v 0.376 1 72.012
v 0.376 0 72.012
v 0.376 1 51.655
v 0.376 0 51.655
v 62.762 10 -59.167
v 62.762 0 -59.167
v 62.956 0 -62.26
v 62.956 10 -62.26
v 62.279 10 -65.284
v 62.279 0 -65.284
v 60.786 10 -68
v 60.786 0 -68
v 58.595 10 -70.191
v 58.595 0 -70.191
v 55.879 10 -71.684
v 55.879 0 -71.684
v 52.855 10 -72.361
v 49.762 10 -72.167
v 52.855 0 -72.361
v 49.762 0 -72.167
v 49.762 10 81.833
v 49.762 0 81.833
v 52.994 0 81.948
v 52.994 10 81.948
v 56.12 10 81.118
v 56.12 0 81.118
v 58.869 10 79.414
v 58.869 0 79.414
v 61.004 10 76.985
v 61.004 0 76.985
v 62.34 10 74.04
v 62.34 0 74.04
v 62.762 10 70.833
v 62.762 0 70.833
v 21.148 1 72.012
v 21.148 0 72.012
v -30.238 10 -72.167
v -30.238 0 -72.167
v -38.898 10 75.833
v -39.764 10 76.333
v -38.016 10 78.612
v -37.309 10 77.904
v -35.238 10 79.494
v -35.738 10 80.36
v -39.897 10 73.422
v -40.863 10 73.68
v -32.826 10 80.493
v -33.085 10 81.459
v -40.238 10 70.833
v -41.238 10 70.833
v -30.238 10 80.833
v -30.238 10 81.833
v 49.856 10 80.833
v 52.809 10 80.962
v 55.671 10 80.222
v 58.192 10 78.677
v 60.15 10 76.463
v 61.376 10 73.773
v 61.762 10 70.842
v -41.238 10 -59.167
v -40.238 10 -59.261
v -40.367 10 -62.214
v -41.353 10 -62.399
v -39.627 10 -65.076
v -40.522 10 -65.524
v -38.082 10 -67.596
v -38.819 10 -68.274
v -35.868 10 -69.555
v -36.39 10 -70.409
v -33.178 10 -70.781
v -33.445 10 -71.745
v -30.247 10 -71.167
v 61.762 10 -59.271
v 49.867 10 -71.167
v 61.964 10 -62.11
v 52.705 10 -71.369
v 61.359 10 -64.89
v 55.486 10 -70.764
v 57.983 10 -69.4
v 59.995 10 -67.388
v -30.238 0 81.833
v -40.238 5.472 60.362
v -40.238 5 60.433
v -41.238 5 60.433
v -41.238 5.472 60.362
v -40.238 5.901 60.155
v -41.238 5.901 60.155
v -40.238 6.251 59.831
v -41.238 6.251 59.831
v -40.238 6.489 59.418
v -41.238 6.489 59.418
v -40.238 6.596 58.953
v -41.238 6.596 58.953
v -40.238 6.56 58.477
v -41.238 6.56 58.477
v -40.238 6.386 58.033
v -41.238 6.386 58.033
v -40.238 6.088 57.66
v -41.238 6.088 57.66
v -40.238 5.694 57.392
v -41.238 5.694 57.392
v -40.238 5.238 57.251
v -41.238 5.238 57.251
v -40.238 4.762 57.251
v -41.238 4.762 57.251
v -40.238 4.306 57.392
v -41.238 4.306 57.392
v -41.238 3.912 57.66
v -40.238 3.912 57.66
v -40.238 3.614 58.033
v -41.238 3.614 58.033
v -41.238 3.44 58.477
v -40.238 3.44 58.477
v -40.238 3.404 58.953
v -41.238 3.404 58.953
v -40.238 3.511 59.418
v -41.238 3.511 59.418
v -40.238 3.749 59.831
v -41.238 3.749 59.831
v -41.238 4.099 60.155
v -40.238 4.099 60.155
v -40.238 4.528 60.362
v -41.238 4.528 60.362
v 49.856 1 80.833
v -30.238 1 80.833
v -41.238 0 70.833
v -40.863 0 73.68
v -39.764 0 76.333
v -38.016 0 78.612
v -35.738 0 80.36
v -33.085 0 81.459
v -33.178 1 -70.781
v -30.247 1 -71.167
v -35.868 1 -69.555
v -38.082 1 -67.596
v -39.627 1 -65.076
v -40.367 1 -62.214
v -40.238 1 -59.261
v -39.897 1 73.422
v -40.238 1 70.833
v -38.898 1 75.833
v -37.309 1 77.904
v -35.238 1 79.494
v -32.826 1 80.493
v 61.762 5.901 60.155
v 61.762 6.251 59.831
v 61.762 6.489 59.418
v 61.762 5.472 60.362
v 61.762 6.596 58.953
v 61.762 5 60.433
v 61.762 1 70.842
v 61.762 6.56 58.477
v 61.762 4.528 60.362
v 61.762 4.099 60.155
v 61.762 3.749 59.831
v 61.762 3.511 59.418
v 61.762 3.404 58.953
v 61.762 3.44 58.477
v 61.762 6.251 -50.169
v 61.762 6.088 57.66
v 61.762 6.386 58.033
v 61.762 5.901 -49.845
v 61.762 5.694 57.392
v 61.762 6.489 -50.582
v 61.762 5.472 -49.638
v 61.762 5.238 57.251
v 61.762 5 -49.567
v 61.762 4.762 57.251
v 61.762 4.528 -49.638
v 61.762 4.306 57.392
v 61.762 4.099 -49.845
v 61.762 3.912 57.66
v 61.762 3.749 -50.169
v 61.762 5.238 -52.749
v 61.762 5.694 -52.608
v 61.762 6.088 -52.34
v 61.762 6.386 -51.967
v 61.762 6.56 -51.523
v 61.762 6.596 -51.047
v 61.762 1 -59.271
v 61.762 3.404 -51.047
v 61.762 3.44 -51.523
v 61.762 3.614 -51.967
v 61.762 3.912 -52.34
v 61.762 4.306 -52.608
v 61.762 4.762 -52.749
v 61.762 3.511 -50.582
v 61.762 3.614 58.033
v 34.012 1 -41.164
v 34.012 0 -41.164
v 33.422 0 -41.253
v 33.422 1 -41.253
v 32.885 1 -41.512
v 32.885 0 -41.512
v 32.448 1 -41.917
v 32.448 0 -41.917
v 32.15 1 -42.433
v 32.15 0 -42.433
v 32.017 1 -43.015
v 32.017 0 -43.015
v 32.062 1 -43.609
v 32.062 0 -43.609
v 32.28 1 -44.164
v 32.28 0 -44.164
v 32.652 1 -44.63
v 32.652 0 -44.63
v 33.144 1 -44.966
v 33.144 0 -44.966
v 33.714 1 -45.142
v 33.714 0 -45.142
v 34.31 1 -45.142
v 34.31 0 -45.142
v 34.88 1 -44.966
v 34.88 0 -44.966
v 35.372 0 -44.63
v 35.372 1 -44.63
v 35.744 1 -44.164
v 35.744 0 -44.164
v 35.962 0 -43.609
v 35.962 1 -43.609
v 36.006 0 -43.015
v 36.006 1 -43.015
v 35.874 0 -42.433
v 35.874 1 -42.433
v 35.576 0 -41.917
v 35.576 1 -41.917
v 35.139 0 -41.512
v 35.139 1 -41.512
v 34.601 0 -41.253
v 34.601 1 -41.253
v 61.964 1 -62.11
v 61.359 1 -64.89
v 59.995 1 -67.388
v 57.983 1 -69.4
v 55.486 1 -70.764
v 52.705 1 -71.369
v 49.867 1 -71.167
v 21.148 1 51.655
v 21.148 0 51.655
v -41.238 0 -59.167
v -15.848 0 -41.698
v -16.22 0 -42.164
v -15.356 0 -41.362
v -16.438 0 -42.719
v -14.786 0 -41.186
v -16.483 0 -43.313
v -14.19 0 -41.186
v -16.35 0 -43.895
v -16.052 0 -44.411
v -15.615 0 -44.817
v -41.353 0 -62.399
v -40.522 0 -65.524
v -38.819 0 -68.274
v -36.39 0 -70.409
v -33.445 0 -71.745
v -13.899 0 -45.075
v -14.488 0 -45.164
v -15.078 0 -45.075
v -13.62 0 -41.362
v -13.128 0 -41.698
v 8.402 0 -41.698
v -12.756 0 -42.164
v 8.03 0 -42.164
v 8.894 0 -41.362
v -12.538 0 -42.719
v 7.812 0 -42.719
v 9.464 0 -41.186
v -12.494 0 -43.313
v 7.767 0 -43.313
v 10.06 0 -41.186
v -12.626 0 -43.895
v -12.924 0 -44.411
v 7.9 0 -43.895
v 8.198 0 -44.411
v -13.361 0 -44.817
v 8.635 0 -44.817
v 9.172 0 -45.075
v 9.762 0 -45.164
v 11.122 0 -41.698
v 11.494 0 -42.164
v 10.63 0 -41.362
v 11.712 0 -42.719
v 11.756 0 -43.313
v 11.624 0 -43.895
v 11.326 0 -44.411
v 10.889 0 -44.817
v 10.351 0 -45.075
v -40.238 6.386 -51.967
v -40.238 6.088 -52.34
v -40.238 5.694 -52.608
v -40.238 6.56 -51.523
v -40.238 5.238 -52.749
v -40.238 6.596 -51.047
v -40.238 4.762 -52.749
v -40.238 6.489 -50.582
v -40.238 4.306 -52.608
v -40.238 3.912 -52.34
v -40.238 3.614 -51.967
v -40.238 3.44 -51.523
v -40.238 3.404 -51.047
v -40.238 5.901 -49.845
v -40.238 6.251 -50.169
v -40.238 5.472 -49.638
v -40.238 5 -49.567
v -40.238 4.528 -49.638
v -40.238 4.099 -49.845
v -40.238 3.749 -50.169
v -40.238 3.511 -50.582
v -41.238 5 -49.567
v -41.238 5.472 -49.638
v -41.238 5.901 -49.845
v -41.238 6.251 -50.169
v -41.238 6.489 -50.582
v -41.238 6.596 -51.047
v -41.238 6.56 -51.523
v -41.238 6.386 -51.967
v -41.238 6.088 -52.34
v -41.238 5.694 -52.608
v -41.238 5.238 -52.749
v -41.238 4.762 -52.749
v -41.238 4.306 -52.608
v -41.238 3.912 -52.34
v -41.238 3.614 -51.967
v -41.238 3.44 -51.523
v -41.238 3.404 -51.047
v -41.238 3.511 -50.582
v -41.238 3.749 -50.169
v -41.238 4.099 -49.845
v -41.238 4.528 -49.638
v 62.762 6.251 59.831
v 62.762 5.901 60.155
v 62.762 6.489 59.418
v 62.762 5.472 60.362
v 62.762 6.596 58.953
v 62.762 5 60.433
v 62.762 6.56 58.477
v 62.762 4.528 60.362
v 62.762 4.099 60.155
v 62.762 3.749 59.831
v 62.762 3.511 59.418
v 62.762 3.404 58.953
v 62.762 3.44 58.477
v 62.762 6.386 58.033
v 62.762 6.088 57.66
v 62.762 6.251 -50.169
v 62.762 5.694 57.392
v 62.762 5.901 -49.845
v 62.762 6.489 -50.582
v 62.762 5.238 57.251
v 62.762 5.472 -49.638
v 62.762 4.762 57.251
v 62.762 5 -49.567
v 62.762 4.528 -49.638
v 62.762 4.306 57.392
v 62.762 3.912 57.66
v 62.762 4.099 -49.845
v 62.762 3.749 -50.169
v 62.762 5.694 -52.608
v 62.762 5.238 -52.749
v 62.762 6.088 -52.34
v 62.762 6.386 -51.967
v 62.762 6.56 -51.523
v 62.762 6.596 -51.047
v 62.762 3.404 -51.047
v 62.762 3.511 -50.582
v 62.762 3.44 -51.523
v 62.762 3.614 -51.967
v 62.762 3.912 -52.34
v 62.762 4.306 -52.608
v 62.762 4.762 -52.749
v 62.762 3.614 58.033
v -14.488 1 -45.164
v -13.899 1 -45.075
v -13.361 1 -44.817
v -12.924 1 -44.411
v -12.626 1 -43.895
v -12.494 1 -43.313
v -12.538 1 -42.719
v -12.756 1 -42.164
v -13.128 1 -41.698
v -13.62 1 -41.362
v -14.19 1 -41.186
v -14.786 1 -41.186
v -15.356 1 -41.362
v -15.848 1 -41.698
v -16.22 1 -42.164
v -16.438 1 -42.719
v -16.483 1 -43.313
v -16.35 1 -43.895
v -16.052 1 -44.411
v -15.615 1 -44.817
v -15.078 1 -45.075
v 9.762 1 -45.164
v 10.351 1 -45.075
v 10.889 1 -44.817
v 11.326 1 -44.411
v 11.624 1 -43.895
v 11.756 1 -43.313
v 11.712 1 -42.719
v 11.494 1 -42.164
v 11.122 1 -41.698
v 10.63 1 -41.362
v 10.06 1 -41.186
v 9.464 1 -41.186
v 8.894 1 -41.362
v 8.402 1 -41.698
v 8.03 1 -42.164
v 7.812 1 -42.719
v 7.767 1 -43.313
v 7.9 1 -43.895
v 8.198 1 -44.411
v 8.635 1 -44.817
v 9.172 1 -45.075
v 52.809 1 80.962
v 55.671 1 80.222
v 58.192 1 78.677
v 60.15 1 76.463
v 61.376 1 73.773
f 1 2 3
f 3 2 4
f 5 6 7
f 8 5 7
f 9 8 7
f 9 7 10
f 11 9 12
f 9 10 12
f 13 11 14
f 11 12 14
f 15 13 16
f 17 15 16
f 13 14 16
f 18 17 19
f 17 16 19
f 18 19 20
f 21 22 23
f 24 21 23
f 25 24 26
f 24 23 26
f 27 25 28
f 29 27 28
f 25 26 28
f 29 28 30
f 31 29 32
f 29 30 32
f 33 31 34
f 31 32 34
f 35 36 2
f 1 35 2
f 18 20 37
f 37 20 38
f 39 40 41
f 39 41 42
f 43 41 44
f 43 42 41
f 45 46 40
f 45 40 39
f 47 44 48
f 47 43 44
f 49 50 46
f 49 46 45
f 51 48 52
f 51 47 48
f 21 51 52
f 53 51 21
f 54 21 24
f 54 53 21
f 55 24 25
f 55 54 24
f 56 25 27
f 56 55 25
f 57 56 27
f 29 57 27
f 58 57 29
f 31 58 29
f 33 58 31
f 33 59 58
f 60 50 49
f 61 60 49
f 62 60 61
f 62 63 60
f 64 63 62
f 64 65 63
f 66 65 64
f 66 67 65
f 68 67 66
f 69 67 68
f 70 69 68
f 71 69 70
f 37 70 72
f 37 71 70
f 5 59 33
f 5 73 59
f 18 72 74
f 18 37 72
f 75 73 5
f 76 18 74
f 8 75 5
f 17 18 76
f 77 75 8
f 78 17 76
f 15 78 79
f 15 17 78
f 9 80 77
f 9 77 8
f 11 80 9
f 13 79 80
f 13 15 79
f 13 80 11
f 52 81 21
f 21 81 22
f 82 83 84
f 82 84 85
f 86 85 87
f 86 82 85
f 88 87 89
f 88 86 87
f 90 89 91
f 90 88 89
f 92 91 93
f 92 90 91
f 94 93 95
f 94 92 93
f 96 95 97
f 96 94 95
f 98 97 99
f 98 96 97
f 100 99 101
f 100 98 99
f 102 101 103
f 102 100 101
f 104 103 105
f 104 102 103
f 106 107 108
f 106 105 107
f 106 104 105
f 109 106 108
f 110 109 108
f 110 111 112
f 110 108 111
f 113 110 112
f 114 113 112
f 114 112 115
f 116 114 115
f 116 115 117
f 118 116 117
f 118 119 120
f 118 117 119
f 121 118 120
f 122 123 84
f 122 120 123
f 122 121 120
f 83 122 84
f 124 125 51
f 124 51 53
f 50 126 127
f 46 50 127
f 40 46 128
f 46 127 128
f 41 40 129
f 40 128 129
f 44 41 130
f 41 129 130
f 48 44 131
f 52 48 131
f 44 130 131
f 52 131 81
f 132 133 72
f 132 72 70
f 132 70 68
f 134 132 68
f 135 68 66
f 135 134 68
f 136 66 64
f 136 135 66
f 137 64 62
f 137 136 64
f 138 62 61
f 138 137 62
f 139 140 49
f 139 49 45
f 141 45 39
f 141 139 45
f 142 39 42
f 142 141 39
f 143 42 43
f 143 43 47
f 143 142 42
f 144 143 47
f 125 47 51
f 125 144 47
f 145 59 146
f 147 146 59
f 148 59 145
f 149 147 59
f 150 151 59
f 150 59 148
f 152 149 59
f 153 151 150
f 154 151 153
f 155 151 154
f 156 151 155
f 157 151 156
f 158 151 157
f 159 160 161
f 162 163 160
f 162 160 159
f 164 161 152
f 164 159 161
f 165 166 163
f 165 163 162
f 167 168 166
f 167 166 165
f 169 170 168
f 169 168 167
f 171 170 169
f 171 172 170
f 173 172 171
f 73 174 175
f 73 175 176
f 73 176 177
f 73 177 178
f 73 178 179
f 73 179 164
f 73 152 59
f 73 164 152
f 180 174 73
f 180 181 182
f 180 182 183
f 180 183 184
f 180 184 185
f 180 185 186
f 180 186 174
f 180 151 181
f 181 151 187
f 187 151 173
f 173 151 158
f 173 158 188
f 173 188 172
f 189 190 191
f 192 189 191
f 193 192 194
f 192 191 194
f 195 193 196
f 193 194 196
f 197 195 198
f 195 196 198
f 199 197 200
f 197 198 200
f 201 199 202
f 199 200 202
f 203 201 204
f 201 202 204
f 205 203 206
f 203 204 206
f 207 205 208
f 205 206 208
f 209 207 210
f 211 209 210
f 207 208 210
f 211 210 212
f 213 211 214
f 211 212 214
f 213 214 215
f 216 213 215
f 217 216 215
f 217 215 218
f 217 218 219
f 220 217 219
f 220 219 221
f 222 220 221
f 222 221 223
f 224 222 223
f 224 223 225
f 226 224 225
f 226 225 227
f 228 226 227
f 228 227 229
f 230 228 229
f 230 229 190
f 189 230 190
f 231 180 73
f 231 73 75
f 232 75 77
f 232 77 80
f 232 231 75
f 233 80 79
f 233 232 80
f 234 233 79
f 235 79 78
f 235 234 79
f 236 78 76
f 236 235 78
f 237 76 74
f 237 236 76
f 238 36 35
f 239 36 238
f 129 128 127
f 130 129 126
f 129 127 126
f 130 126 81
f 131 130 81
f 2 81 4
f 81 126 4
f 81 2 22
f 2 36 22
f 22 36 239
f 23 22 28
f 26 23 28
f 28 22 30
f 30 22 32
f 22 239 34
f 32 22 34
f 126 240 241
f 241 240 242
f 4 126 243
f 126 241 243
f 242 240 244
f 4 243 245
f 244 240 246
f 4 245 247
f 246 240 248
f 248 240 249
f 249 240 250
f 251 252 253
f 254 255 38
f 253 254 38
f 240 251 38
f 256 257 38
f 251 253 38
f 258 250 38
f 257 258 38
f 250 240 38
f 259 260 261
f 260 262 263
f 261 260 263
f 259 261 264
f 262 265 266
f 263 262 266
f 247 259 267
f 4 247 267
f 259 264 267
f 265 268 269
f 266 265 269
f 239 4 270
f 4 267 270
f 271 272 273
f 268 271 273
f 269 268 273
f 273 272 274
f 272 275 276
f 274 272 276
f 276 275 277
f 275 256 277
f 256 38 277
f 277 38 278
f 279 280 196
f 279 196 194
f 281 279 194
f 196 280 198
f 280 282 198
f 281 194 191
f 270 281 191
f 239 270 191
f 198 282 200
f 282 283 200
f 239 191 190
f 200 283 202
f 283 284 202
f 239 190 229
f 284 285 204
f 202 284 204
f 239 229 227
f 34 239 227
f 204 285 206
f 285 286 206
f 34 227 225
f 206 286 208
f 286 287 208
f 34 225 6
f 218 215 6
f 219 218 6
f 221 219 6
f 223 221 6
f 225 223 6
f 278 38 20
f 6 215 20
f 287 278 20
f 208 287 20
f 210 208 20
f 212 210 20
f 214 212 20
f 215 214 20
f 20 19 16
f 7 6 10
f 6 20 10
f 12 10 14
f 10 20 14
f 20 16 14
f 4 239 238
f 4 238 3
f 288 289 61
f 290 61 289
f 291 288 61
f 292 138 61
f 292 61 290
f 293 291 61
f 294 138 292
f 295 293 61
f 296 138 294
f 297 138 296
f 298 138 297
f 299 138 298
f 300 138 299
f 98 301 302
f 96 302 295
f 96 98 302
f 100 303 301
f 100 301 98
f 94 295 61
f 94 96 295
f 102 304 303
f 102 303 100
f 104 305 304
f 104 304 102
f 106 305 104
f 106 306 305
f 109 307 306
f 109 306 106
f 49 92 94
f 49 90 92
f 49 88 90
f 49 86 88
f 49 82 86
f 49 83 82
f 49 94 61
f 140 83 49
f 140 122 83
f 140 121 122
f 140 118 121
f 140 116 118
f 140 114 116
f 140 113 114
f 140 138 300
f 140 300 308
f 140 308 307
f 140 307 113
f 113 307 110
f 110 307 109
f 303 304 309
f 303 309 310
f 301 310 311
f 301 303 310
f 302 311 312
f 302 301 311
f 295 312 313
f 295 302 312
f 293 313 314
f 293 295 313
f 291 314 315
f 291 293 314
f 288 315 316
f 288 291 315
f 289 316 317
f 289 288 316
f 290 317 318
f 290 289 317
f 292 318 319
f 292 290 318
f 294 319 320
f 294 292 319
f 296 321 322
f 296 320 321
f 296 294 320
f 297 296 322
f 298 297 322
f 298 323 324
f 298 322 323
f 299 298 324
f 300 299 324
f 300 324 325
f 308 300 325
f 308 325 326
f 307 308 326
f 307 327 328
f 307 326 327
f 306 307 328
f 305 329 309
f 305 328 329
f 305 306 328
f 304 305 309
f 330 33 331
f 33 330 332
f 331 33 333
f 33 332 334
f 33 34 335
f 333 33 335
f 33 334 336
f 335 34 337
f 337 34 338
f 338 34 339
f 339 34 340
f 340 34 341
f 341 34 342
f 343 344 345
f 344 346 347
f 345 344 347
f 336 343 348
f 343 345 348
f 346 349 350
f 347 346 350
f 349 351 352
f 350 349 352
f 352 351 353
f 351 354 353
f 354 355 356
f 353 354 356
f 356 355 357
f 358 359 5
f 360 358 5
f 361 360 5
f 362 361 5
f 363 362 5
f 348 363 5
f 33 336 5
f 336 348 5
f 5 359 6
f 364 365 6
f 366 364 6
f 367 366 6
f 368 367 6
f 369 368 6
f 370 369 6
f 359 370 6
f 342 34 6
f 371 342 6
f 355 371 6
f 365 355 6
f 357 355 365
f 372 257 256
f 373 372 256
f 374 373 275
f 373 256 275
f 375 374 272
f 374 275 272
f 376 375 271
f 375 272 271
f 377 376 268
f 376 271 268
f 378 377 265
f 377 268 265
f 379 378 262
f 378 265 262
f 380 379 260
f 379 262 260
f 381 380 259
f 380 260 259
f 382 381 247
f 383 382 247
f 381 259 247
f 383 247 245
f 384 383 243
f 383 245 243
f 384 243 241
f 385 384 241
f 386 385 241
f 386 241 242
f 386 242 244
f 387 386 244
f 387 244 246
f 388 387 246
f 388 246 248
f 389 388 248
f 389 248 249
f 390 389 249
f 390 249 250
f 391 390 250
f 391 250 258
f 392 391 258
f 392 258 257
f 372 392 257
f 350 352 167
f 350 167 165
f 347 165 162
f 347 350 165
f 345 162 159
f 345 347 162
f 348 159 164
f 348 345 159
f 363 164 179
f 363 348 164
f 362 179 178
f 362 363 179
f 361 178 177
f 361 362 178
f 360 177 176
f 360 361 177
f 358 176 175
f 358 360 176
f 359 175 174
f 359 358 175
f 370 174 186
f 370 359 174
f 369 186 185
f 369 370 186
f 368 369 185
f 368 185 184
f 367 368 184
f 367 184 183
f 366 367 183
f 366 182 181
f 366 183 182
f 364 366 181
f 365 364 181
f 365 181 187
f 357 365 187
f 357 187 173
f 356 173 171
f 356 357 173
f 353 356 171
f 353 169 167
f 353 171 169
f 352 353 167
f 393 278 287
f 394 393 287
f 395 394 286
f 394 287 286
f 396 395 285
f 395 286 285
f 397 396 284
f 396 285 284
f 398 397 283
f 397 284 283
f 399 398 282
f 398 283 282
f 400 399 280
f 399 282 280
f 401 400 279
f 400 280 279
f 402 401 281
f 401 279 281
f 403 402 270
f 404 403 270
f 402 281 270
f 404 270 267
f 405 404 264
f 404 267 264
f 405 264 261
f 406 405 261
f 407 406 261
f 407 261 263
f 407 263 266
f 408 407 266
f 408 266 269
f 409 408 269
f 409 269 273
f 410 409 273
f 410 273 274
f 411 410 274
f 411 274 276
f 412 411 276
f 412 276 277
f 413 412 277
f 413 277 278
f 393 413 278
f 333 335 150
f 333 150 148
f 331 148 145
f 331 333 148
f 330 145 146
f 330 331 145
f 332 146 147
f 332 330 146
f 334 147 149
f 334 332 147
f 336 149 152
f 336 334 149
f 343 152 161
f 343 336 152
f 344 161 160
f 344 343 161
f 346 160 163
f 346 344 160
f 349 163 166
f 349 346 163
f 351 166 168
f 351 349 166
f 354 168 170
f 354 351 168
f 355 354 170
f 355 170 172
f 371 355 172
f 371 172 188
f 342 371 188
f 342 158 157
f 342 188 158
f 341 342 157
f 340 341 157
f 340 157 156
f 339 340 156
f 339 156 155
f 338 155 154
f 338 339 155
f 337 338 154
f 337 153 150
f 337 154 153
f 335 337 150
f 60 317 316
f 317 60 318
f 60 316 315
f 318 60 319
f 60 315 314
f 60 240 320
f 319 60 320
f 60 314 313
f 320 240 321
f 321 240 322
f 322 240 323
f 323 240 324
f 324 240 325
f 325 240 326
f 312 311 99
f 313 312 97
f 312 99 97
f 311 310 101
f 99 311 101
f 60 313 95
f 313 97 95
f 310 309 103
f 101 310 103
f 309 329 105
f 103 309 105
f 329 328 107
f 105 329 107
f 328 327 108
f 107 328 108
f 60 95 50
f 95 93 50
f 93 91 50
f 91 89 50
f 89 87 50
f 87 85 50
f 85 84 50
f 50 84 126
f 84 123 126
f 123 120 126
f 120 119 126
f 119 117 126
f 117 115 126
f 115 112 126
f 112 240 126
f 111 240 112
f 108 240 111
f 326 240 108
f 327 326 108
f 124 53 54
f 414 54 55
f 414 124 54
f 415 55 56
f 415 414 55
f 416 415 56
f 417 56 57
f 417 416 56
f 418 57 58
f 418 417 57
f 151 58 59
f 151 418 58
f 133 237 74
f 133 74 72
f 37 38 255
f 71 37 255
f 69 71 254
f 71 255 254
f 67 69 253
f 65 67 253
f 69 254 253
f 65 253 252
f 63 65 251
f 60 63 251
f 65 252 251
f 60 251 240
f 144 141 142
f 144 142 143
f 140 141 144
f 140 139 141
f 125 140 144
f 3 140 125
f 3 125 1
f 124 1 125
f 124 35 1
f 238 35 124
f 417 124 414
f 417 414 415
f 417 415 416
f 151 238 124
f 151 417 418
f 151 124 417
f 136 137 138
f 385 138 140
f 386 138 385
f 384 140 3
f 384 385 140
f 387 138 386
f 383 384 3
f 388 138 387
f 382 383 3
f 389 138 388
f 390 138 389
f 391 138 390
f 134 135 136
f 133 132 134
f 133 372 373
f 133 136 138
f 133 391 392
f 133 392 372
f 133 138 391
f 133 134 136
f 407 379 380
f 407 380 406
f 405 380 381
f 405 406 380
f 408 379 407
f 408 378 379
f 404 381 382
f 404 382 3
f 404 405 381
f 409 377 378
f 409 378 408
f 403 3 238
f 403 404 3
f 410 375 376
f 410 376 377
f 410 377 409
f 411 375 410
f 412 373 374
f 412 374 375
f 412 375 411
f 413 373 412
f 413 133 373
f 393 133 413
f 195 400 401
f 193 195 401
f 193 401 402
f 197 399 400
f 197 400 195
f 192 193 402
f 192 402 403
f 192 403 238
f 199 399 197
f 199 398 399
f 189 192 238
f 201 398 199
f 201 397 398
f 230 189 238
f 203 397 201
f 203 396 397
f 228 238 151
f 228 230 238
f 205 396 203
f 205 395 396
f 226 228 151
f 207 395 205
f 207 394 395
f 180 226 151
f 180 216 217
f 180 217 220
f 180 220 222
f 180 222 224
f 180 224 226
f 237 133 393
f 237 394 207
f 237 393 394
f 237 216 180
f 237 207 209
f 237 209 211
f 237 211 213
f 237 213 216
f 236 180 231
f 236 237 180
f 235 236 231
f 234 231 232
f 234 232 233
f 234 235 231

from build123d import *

# Parameters (mm, degrees)
EXTRUDE_1_DEPTH          = 10
SHELL_START              = 1
SHELL_5_DEPTH            = 9
CUT_EXTRUDE_1_DEPTH      = 134.004728562
CUT_EXTRUDE_1_DEPTH_BACK = 134.004728562
SKETCH_2_R               = 1.6
SKETCH_6_W               = 20.772573636
SKETCH_6_H               = 20.357122163
CUT_EXTRUDE_2_DEPTH      = 104.896631765
CUT_EXTRUDE_3_REACH      = 105.897
SKETCH_9_R               = 2


# Read off the part's stored shape, not the designer's step: 薄殼5
with BuildPart() as part:
    # 草圖1 → 填料-伸長1 (new body)
    with BuildSketch(Plane(origin=(0, 0, 0), x_dir=(1, 0, 0), z_dir=(0, 1, 0))):
        with BuildLine():
            Line((-41.238095238, 59.166666667), (-41.238095238, -70.833333333))
            ThreePointArc((-41.238095238, -70.833333333), (-38.016269831, -78.611507926), (-30.238095238, -81.833333333))
            Line((-30.238095238, -81.833333333), (49.761904762, -81.833333333))
            ThreePointArc((49.761904762, -81.833333333), (58.868802246, -79.414212178), (62.761904762, -70.833333333))
            Line((62.761904762, -70.833333333), (62.761904762, 59.166666667))
            ThreePointArc((62.761904762, 59.166666667), (59.768077482, 69.172839387), (49.761904762, 72.166666667))
            Line((49.761904762, 72.166666667), (-30.238095238, 72.166666667))
            ThreePointArc((-30.238095238, 72.166666667), (-38.818974083, 68.273564151), (-41.238095238, 59.166666667))
        make_face()
    extrude(amount=EXTRUDE_1_DEPTH)

    # 薄殼5 outline → 薄殼5 (cut)
    with BuildSketch(Plane(origin=(0, 0, 0), x_dir=(1, 0, 0), z_dir=(0, 1, 0)).offset(SHELL_START)):
        with BuildLine():
            ThreePointArc((-30.246641499, 71.166666667), (-38.08182369, 67.59648754), (-40.238095238, 59.260616141))
            Line((-40.238095238, 59.260616141), (-40.238095238, -70.833333333))
            ThreePointArc((-40.238095238, -70.833333333), (-37.30916305, -77.904401145), (-30.238095238, -80.833333333))
            Line((-30.238095238, -80.833333333), (49.855854237, -80.833333333))
            ThreePointArc((49.855854237, -80.833333333), (58.191725636, -78.677061785), (61.761904762, -70.841879594))
            Line((61.761904762, -70.841879594), (61.761904762, 59.271464521))
            ThreePointArc((61.761904762, 59.271464521), (59.060970701, 68.465732606), (49.866702616, 71.166666667))
            Line((49.866702616, 71.166666667), (-30.246641499, 71.166666667))
        make_face()
    extrude(amount=SHELL_5_DEPTH, mode=Mode.SUBTRACT)

    # 草圖2 → 除料-伸長1 (cut, two sides: drawn at the far end of the back side and taken through both)
    with BuildSketch(Plane.ZY.offset(41.238095238).offset(-CUT_EXTRUDE_1_DEPTH_BACK)):
        with Locations((-51.166666667, 5)):
            Circle(SKETCH_2_R)
        with Locations((58.833333333, 5)):
            Circle(SKETCH_2_R)
    extrude(amount=CUT_EXTRUDE_1_DEPTH + CUT_EXTRUDE_1_DEPTH_BACK, mode=Mode.SUBTRACT)

    # 草圖6 → 除料-伸長2 (cut, through all)
    with BuildSketch(Plane(origin=(0, 0, 0), x_dir=(-1, 0, 0), z_dir=(0, -1, 0))):
        with Locations((-10.761904762, -61.833333334)):
            Rectangle(SKETCH_6_W, SKETCH_6_H)
    extrude(amount=-CUT_EXTRUDE_2_DEPTH, mode=Mode.SUBTRACT)

    # 草圖9 → 除料-伸長3 (cut, up to next)
    with BuildSketch(Plane.XZ, mode=Mode.PRIVATE) as cut_extrude_3_sk1:
        with Locations(Location((-14.488095238, -43.164036493, 0), (0, 0, 270))):
            Circle(SKETCH_9_R)
    cut_extrude_3_tool1 = extrude(cut_extrude_3_sk1.sketch, amount=-CUT_EXTRUDE_3_REACH, mode=Mode.PRIVATE) & part.part
    # 草圖9 → 除料-伸長3 (cut, up to next)
    with BuildSketch(Plane.XZ, mode=Mode.PRIVATE) as cut_extrude_3_sk2:
        with Locations(Location((34.011904762, -43.164036493, 0), (0, 0, 90))):
            Circle(SKETCH_9_R)
    cut_extrude_3_tool2 = extrude(cut_extrude_3_sk2.sketch, amount=-CUT_EXTRUDE_3_REACH, mode=Mode.PRIVATE) & part.part
    # 草圖9 → 除料-伸長3 (cut, up to next)
    with BuildSketch(Plane.XZ, mode=Mode.PRIVATE) as cut_extrude_3_sk3:
        with Locations(Location((9.761904762, -43.164036493, 0), (0, 0, 270))):
            Circle(SKETCH_9_R)
    cut_extrude_3_tool3 = extrude(cut_extrude_3_sk3.sketch, amount=-CUT_EXTRUDE_3_REACH, mode=Mode.PRIVATE) & part.part
    add(cut_extrude_3_tool1.solids().sort_by_distance((-14.488095, 0, -43.164036))[0], mode=Mode.SUBTRACT)
    add(cut_extrude_3_tool2.solids().sort_by_distance((34.011905, 0, -43.164036))[0], mode=Mode.SUBTRACT)
    add(cut_extrude_3_tool3.solids().sort_by_distance((9.761905, 0, -43.164036))[0], mode=Mode.SUBTRACT)


solid = part.part
